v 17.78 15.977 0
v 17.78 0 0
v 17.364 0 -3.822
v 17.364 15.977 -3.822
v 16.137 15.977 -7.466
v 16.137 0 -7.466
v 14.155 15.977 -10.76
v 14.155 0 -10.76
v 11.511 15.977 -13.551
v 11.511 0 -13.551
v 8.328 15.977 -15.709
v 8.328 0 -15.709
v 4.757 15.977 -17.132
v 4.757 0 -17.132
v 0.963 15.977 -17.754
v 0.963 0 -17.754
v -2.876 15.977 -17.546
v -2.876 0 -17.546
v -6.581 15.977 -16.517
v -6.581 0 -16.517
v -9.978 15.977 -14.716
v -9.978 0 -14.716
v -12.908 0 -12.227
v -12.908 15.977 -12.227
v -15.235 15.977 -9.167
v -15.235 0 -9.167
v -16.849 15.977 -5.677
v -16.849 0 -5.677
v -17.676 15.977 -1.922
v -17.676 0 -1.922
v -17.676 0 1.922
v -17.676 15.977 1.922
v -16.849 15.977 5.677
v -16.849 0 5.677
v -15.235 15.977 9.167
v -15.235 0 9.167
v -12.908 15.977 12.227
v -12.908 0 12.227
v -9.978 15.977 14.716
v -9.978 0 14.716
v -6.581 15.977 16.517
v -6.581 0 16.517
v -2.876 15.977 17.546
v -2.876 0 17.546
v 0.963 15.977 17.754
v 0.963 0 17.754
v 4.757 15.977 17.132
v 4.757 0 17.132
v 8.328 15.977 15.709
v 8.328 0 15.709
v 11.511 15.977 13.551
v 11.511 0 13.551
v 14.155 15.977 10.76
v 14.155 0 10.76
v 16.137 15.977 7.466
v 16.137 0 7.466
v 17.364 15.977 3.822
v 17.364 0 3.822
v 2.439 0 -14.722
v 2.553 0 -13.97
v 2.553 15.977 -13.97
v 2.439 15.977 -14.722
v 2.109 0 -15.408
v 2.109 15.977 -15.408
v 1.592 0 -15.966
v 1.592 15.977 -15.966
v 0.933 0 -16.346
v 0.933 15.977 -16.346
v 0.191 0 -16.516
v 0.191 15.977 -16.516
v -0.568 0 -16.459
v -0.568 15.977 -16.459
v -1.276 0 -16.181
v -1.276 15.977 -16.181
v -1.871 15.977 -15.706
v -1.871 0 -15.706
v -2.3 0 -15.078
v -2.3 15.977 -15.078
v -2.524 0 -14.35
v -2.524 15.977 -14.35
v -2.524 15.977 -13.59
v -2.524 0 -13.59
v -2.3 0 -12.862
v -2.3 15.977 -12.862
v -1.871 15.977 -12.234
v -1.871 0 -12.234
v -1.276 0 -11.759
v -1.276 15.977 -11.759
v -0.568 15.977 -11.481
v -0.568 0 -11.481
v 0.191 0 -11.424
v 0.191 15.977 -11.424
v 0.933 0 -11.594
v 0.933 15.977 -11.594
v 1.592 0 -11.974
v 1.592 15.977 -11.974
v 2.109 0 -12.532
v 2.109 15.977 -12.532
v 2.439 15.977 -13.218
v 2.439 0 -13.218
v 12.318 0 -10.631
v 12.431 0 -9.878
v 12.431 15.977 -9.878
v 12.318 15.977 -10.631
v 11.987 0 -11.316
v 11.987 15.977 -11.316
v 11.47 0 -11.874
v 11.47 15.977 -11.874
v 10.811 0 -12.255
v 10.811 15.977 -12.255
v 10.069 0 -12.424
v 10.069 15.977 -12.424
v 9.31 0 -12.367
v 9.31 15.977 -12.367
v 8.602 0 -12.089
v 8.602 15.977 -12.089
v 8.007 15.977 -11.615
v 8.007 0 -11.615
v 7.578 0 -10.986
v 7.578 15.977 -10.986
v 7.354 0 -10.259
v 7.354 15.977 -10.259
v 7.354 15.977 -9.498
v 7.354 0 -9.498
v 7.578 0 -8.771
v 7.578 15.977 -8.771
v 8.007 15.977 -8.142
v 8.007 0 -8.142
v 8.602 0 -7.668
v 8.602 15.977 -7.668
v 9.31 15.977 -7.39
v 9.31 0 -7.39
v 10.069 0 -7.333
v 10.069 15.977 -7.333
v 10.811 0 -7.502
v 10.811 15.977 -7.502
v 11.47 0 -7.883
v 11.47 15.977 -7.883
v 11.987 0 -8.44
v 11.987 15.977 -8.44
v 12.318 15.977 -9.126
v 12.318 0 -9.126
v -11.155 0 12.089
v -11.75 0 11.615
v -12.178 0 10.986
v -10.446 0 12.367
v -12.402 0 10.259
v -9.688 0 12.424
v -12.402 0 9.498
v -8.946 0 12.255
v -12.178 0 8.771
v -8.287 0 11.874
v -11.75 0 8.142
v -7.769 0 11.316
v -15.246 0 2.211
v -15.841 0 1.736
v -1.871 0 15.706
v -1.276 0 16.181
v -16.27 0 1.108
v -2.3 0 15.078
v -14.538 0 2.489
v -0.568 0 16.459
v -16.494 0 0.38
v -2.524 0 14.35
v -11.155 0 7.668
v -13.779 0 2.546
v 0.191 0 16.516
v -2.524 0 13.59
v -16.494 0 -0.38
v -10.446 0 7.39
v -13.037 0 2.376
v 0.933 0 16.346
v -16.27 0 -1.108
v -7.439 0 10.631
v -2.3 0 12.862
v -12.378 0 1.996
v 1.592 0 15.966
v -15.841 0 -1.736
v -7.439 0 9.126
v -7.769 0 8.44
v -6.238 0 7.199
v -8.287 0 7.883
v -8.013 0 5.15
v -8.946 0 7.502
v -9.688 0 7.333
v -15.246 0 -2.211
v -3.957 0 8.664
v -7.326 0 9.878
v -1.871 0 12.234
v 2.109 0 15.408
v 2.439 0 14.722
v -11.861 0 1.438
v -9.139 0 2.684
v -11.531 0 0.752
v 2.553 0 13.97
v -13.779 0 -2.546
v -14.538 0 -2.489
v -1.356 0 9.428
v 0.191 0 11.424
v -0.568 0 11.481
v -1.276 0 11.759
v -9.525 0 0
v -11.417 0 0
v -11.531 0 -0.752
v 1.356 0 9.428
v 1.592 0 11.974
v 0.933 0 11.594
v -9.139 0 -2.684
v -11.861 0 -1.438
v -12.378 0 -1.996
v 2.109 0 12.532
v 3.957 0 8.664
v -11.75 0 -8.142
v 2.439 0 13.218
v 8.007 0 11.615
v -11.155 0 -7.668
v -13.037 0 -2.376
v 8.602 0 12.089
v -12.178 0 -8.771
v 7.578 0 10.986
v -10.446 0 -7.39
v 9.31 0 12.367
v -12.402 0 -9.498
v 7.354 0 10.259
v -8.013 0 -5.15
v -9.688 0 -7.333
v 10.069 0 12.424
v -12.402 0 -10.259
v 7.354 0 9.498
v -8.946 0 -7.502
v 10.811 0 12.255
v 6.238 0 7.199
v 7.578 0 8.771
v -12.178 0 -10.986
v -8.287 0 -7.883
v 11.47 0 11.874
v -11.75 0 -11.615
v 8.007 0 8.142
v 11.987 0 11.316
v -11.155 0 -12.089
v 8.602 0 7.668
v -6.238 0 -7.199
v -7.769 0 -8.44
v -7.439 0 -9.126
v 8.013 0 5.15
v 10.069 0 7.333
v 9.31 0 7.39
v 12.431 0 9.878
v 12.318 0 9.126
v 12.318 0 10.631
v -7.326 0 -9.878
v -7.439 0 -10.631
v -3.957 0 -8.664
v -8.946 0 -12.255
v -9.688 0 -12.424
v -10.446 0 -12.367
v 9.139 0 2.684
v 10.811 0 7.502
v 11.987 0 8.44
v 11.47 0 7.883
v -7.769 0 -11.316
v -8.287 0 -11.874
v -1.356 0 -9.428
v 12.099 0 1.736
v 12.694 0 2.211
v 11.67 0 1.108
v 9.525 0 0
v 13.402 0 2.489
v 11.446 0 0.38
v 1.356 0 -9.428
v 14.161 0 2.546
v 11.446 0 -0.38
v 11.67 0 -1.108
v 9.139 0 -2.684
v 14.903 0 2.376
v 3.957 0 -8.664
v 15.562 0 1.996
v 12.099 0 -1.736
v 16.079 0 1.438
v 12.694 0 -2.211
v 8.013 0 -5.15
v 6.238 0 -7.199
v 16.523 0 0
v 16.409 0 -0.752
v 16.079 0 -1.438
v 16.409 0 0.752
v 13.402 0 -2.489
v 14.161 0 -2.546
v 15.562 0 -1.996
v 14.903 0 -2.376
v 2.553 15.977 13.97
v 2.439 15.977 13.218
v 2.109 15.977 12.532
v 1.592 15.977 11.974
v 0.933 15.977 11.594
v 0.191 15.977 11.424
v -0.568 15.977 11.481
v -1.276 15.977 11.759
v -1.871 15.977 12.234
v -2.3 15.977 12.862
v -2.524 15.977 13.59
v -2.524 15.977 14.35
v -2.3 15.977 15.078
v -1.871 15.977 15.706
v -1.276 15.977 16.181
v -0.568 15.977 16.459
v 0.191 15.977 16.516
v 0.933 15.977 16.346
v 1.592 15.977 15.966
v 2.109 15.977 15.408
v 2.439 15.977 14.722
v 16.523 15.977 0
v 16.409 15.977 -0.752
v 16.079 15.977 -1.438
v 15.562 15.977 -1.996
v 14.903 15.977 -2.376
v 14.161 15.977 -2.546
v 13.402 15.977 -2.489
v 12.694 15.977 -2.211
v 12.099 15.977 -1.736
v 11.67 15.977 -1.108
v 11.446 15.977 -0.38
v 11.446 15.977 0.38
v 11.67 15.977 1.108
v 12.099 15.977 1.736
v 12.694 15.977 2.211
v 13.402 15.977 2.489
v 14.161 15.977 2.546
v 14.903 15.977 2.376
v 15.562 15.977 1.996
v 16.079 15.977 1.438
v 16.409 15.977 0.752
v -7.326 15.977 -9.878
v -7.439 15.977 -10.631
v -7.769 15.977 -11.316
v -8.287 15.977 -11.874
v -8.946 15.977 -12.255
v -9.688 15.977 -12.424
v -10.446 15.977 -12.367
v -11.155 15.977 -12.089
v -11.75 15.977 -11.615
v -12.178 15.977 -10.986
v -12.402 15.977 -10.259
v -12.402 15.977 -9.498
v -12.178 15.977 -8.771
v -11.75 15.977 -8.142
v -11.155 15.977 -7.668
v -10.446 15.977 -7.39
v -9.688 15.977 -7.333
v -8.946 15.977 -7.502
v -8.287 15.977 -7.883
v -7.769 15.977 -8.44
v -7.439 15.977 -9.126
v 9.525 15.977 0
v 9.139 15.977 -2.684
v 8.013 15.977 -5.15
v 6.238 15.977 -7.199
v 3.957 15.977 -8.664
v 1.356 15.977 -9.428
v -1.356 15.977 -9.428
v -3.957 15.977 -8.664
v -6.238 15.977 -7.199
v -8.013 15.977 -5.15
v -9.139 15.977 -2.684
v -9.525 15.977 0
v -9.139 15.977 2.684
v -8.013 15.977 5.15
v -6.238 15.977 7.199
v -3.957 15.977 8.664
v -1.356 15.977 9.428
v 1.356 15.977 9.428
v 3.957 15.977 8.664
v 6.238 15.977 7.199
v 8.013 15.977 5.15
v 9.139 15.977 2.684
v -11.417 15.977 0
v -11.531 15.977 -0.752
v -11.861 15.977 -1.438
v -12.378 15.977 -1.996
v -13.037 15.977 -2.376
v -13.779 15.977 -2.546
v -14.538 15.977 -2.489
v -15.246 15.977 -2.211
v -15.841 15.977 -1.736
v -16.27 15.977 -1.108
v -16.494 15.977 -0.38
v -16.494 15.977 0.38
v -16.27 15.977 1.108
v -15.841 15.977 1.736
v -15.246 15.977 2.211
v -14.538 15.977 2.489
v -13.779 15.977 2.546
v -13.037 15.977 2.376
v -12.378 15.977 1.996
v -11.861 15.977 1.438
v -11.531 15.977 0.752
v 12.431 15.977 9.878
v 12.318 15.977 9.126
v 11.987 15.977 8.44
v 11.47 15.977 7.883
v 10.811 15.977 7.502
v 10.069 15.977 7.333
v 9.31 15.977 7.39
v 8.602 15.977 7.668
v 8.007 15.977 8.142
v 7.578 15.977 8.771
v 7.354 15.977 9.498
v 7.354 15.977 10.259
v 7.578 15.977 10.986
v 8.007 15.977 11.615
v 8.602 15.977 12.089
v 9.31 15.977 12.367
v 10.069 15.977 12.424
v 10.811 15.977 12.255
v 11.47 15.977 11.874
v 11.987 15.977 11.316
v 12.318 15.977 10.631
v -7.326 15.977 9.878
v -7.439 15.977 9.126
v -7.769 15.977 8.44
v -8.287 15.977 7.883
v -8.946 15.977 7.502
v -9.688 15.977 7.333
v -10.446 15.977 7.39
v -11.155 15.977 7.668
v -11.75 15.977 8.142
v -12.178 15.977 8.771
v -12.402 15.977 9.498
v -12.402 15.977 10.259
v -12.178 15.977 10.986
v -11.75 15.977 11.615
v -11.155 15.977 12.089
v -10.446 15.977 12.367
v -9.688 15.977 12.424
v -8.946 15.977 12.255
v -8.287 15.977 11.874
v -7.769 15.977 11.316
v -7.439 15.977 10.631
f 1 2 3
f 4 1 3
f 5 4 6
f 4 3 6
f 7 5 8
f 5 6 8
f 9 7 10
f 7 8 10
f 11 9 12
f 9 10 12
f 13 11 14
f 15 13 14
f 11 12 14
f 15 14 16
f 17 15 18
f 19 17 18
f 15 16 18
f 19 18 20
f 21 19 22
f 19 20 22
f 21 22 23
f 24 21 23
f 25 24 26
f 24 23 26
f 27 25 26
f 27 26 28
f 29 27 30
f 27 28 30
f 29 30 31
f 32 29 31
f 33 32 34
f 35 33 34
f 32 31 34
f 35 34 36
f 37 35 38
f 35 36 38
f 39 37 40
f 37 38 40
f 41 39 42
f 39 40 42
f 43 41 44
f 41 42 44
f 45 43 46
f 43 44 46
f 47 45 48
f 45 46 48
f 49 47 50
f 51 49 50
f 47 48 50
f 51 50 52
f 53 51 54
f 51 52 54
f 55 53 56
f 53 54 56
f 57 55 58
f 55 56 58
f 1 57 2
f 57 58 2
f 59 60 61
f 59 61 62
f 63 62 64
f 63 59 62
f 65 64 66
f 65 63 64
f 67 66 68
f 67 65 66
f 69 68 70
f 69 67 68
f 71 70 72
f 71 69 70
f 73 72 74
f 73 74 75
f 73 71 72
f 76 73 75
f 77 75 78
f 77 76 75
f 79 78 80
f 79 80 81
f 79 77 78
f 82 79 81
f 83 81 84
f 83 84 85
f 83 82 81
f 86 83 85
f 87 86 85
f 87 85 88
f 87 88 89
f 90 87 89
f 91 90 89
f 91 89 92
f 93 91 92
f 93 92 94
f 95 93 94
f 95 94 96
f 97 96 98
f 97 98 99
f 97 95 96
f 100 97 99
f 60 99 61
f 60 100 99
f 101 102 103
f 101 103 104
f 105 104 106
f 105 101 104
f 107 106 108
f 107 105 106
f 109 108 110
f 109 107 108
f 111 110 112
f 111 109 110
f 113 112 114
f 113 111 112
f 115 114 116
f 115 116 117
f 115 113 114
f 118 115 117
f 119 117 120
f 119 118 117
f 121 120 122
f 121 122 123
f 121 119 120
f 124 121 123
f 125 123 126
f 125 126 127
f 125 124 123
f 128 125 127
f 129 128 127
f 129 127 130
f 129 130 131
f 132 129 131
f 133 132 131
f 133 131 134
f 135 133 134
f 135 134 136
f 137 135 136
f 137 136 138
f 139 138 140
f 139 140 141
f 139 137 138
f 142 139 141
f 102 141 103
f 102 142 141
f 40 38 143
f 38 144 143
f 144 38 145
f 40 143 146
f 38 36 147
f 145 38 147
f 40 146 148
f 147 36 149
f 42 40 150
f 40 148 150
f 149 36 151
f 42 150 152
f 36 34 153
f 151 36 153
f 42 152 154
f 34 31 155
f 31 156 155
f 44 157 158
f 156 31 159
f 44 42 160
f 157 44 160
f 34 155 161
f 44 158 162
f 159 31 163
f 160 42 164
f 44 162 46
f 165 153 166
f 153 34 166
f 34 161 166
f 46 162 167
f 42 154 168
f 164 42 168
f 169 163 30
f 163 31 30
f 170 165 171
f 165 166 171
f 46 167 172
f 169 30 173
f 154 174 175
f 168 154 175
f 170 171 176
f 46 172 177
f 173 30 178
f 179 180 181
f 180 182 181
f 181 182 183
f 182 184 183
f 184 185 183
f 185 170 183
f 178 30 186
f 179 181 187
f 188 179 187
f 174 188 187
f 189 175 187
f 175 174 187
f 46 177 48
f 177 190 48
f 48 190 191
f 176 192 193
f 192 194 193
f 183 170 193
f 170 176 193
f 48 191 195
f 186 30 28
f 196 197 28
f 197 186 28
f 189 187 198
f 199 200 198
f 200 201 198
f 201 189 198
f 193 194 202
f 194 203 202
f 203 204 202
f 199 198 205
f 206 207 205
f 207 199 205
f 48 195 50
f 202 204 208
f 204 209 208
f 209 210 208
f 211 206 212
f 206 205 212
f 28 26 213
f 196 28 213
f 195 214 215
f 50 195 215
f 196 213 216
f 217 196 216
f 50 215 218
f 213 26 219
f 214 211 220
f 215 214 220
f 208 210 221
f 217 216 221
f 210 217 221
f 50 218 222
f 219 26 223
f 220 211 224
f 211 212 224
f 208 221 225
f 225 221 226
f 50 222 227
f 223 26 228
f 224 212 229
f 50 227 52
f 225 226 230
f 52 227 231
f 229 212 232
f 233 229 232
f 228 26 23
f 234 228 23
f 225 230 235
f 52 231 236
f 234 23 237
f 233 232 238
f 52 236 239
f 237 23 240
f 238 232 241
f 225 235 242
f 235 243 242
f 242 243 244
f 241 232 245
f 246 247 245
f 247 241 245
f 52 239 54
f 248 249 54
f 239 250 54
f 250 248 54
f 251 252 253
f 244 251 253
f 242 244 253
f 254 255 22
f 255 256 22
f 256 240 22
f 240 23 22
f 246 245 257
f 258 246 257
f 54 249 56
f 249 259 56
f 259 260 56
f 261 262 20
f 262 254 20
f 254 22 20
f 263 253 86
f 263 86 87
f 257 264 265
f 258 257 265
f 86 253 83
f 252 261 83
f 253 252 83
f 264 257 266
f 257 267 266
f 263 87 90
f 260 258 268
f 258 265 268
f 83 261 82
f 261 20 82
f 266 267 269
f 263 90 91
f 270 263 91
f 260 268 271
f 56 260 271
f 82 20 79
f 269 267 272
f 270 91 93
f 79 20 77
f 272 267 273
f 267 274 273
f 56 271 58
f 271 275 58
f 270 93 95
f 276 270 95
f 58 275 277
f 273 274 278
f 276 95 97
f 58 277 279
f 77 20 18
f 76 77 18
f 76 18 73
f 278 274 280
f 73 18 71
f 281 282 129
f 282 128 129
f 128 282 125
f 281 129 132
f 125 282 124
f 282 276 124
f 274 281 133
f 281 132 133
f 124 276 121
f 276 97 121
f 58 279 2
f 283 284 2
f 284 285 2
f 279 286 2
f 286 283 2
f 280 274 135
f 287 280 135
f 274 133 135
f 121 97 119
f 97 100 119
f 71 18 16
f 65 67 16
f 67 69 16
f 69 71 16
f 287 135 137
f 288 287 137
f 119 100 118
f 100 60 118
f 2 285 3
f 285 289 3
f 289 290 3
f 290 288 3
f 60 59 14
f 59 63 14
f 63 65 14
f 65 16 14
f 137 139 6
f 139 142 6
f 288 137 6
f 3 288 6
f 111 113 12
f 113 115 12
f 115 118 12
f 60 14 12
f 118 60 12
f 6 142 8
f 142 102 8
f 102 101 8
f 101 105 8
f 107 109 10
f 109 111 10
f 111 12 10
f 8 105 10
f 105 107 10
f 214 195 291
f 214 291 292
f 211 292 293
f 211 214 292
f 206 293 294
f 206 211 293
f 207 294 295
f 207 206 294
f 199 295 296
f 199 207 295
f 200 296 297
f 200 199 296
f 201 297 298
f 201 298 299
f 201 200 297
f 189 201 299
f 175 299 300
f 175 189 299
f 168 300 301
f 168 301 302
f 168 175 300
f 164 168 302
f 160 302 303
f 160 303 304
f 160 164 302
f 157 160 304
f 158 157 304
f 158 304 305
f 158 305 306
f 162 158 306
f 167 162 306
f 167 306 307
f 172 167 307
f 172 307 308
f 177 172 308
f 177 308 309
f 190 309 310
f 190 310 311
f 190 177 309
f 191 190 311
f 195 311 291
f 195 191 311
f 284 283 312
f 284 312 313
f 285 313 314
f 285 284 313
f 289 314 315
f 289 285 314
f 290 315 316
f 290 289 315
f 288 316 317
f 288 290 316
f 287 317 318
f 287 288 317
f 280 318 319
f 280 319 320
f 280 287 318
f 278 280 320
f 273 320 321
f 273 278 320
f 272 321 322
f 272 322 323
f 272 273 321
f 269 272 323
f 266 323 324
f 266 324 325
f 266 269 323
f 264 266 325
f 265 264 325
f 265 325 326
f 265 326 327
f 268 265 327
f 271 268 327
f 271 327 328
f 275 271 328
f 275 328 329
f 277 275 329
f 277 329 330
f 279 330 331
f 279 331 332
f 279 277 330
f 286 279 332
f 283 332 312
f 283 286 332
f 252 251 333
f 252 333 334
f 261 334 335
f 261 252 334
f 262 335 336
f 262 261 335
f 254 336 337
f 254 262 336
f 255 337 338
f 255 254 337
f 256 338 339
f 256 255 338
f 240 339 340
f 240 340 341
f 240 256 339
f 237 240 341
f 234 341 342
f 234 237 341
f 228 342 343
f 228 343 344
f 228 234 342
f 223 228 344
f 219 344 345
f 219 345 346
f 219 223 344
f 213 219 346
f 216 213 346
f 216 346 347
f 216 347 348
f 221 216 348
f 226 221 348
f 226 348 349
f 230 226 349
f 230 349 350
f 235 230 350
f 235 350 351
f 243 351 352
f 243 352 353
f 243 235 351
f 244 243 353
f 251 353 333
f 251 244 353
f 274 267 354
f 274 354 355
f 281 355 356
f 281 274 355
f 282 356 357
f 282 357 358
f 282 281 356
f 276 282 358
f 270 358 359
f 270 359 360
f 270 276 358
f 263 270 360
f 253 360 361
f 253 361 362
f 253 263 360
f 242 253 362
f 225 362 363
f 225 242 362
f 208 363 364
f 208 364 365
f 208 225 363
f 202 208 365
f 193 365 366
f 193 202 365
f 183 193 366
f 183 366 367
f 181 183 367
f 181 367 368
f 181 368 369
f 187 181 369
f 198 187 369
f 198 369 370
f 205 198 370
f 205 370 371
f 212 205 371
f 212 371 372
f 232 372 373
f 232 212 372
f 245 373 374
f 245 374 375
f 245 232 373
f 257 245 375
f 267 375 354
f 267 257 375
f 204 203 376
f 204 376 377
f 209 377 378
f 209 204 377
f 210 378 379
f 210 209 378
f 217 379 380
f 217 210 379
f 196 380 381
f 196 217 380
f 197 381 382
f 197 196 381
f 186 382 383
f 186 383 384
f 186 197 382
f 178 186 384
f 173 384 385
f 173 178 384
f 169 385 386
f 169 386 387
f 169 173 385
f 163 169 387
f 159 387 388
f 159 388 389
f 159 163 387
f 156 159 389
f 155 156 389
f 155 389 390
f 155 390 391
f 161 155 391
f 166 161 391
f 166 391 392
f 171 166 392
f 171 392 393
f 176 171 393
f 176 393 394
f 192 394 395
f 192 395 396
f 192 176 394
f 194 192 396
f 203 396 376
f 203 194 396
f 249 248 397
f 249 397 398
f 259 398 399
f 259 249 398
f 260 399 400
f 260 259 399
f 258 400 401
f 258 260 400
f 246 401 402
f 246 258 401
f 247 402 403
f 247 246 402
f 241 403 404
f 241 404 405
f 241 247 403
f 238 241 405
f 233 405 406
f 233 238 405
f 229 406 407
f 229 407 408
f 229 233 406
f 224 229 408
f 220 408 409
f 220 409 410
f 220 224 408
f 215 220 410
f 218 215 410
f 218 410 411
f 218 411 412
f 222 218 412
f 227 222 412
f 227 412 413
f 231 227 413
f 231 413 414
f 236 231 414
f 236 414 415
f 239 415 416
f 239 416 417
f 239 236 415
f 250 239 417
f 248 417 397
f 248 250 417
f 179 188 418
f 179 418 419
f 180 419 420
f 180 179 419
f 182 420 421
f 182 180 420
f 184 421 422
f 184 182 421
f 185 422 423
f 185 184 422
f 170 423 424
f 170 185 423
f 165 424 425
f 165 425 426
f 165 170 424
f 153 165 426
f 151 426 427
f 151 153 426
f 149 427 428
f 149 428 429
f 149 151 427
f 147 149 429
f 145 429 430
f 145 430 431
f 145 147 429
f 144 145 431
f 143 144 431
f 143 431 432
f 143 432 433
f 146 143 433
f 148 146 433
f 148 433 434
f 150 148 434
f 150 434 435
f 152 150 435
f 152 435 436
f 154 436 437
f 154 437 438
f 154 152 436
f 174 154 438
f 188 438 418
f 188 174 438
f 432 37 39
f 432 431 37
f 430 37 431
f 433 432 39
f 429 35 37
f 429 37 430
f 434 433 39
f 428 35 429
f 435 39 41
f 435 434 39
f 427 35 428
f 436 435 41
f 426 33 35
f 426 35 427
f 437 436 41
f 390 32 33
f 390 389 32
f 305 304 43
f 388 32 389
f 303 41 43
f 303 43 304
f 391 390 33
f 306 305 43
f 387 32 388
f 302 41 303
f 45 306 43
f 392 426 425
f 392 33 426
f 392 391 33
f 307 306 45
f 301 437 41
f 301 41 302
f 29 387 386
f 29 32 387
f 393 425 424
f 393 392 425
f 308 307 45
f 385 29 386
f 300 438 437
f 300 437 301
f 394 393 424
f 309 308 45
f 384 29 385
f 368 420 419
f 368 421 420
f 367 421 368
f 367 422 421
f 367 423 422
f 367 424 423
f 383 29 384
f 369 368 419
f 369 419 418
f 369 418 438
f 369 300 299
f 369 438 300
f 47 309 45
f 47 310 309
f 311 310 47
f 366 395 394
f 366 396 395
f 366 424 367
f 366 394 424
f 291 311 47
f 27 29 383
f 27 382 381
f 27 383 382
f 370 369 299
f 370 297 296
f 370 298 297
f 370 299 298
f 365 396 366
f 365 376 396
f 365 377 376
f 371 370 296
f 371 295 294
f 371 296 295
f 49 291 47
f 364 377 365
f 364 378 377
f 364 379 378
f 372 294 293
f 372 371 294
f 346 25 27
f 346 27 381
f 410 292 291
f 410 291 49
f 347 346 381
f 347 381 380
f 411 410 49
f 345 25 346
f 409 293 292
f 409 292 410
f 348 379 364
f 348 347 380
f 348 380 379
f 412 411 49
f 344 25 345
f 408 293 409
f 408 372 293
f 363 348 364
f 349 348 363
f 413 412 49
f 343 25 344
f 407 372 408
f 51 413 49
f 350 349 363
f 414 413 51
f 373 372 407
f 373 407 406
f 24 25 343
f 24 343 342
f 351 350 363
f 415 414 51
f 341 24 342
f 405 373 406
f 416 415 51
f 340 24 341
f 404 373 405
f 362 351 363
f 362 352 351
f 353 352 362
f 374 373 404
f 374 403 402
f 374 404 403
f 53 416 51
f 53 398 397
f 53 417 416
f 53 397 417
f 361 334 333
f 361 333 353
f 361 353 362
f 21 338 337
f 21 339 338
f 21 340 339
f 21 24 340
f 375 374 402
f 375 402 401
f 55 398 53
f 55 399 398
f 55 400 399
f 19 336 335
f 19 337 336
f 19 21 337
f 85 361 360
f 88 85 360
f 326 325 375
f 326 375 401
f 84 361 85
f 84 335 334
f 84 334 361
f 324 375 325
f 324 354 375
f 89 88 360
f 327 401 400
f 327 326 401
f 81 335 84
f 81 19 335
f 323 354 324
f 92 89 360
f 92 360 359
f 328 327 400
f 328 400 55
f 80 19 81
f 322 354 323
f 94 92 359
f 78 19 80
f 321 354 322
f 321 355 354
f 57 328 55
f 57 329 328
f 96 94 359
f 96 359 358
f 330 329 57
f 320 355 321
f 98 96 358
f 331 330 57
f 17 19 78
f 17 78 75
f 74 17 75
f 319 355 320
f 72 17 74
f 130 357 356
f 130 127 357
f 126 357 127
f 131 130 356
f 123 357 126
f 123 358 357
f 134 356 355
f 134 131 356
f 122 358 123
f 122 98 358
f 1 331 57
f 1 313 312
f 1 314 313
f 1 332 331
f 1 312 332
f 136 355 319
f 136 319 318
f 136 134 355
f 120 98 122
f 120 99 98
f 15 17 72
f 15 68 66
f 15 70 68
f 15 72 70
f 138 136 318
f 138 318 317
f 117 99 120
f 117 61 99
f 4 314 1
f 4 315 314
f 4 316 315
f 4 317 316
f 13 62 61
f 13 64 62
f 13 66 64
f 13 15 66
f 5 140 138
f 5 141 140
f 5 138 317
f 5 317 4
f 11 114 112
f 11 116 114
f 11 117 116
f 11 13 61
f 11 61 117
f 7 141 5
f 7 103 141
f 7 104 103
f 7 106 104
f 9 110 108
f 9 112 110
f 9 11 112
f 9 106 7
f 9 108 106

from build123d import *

# Parameters (mm, degrees)
SKETCH1_R           = 17.78
SKETCH1_R_2         = 2.5527
SKETCH1_R_3         = 9.525
BOSS_EXTRUDE1_DEPTH = 15.9766


with BuildPart() as part:
    # Sketch1 → Boss-Extrude1 (new body)
    with BuildSketch(Plane(origin=(0, 0, 0), x_dir=(1, 0, 0), z_dir=(0, 1, 0))):
        Circle(SKETCH1_R)
        with Locations((0, 13.97)):
            Circle(SKETCH1_R_2, mode=Mode.SUBTRACT)
        with Locations((9.878281733, 9.878281733)):
            Circle(SKETCH1_R_2, mode=Mode.SUBTRACT)
        with Locations((13.97, 0)):
            Circle(SKETCH1_R_2, mode=Mode.SUBTRACT)
        with Locations((9.878281733, -9.878281733)):
            Circle(SKETCH1_R_2, mode=Mode.SUBTRACT)
        with Locations((0, -13.97)):
            Circle(SKETCH1_R_2, mode=Mode.SUBTRACT)
        with Locations((-9.878281733, -9.878281733)):
            Circle(SKETCH1_R_2, mode=Mode.SUBTRACT)
        with Locations((-13.97, 0)):
            Circle(SKETCH1_R_2, mode=Mode.SUBTRACT)
        with Locations((-9.878281733, 9.878281733)):
            Circle(SKETCH1_R_2, mode=Mode.SUBTRACT)
        Circle(SKETCH1_R_3, mode=Mode.SUBTRACT)
    extrude(amount=BOSS_EXTRUDE1_DEPTH)


solid = part.part
